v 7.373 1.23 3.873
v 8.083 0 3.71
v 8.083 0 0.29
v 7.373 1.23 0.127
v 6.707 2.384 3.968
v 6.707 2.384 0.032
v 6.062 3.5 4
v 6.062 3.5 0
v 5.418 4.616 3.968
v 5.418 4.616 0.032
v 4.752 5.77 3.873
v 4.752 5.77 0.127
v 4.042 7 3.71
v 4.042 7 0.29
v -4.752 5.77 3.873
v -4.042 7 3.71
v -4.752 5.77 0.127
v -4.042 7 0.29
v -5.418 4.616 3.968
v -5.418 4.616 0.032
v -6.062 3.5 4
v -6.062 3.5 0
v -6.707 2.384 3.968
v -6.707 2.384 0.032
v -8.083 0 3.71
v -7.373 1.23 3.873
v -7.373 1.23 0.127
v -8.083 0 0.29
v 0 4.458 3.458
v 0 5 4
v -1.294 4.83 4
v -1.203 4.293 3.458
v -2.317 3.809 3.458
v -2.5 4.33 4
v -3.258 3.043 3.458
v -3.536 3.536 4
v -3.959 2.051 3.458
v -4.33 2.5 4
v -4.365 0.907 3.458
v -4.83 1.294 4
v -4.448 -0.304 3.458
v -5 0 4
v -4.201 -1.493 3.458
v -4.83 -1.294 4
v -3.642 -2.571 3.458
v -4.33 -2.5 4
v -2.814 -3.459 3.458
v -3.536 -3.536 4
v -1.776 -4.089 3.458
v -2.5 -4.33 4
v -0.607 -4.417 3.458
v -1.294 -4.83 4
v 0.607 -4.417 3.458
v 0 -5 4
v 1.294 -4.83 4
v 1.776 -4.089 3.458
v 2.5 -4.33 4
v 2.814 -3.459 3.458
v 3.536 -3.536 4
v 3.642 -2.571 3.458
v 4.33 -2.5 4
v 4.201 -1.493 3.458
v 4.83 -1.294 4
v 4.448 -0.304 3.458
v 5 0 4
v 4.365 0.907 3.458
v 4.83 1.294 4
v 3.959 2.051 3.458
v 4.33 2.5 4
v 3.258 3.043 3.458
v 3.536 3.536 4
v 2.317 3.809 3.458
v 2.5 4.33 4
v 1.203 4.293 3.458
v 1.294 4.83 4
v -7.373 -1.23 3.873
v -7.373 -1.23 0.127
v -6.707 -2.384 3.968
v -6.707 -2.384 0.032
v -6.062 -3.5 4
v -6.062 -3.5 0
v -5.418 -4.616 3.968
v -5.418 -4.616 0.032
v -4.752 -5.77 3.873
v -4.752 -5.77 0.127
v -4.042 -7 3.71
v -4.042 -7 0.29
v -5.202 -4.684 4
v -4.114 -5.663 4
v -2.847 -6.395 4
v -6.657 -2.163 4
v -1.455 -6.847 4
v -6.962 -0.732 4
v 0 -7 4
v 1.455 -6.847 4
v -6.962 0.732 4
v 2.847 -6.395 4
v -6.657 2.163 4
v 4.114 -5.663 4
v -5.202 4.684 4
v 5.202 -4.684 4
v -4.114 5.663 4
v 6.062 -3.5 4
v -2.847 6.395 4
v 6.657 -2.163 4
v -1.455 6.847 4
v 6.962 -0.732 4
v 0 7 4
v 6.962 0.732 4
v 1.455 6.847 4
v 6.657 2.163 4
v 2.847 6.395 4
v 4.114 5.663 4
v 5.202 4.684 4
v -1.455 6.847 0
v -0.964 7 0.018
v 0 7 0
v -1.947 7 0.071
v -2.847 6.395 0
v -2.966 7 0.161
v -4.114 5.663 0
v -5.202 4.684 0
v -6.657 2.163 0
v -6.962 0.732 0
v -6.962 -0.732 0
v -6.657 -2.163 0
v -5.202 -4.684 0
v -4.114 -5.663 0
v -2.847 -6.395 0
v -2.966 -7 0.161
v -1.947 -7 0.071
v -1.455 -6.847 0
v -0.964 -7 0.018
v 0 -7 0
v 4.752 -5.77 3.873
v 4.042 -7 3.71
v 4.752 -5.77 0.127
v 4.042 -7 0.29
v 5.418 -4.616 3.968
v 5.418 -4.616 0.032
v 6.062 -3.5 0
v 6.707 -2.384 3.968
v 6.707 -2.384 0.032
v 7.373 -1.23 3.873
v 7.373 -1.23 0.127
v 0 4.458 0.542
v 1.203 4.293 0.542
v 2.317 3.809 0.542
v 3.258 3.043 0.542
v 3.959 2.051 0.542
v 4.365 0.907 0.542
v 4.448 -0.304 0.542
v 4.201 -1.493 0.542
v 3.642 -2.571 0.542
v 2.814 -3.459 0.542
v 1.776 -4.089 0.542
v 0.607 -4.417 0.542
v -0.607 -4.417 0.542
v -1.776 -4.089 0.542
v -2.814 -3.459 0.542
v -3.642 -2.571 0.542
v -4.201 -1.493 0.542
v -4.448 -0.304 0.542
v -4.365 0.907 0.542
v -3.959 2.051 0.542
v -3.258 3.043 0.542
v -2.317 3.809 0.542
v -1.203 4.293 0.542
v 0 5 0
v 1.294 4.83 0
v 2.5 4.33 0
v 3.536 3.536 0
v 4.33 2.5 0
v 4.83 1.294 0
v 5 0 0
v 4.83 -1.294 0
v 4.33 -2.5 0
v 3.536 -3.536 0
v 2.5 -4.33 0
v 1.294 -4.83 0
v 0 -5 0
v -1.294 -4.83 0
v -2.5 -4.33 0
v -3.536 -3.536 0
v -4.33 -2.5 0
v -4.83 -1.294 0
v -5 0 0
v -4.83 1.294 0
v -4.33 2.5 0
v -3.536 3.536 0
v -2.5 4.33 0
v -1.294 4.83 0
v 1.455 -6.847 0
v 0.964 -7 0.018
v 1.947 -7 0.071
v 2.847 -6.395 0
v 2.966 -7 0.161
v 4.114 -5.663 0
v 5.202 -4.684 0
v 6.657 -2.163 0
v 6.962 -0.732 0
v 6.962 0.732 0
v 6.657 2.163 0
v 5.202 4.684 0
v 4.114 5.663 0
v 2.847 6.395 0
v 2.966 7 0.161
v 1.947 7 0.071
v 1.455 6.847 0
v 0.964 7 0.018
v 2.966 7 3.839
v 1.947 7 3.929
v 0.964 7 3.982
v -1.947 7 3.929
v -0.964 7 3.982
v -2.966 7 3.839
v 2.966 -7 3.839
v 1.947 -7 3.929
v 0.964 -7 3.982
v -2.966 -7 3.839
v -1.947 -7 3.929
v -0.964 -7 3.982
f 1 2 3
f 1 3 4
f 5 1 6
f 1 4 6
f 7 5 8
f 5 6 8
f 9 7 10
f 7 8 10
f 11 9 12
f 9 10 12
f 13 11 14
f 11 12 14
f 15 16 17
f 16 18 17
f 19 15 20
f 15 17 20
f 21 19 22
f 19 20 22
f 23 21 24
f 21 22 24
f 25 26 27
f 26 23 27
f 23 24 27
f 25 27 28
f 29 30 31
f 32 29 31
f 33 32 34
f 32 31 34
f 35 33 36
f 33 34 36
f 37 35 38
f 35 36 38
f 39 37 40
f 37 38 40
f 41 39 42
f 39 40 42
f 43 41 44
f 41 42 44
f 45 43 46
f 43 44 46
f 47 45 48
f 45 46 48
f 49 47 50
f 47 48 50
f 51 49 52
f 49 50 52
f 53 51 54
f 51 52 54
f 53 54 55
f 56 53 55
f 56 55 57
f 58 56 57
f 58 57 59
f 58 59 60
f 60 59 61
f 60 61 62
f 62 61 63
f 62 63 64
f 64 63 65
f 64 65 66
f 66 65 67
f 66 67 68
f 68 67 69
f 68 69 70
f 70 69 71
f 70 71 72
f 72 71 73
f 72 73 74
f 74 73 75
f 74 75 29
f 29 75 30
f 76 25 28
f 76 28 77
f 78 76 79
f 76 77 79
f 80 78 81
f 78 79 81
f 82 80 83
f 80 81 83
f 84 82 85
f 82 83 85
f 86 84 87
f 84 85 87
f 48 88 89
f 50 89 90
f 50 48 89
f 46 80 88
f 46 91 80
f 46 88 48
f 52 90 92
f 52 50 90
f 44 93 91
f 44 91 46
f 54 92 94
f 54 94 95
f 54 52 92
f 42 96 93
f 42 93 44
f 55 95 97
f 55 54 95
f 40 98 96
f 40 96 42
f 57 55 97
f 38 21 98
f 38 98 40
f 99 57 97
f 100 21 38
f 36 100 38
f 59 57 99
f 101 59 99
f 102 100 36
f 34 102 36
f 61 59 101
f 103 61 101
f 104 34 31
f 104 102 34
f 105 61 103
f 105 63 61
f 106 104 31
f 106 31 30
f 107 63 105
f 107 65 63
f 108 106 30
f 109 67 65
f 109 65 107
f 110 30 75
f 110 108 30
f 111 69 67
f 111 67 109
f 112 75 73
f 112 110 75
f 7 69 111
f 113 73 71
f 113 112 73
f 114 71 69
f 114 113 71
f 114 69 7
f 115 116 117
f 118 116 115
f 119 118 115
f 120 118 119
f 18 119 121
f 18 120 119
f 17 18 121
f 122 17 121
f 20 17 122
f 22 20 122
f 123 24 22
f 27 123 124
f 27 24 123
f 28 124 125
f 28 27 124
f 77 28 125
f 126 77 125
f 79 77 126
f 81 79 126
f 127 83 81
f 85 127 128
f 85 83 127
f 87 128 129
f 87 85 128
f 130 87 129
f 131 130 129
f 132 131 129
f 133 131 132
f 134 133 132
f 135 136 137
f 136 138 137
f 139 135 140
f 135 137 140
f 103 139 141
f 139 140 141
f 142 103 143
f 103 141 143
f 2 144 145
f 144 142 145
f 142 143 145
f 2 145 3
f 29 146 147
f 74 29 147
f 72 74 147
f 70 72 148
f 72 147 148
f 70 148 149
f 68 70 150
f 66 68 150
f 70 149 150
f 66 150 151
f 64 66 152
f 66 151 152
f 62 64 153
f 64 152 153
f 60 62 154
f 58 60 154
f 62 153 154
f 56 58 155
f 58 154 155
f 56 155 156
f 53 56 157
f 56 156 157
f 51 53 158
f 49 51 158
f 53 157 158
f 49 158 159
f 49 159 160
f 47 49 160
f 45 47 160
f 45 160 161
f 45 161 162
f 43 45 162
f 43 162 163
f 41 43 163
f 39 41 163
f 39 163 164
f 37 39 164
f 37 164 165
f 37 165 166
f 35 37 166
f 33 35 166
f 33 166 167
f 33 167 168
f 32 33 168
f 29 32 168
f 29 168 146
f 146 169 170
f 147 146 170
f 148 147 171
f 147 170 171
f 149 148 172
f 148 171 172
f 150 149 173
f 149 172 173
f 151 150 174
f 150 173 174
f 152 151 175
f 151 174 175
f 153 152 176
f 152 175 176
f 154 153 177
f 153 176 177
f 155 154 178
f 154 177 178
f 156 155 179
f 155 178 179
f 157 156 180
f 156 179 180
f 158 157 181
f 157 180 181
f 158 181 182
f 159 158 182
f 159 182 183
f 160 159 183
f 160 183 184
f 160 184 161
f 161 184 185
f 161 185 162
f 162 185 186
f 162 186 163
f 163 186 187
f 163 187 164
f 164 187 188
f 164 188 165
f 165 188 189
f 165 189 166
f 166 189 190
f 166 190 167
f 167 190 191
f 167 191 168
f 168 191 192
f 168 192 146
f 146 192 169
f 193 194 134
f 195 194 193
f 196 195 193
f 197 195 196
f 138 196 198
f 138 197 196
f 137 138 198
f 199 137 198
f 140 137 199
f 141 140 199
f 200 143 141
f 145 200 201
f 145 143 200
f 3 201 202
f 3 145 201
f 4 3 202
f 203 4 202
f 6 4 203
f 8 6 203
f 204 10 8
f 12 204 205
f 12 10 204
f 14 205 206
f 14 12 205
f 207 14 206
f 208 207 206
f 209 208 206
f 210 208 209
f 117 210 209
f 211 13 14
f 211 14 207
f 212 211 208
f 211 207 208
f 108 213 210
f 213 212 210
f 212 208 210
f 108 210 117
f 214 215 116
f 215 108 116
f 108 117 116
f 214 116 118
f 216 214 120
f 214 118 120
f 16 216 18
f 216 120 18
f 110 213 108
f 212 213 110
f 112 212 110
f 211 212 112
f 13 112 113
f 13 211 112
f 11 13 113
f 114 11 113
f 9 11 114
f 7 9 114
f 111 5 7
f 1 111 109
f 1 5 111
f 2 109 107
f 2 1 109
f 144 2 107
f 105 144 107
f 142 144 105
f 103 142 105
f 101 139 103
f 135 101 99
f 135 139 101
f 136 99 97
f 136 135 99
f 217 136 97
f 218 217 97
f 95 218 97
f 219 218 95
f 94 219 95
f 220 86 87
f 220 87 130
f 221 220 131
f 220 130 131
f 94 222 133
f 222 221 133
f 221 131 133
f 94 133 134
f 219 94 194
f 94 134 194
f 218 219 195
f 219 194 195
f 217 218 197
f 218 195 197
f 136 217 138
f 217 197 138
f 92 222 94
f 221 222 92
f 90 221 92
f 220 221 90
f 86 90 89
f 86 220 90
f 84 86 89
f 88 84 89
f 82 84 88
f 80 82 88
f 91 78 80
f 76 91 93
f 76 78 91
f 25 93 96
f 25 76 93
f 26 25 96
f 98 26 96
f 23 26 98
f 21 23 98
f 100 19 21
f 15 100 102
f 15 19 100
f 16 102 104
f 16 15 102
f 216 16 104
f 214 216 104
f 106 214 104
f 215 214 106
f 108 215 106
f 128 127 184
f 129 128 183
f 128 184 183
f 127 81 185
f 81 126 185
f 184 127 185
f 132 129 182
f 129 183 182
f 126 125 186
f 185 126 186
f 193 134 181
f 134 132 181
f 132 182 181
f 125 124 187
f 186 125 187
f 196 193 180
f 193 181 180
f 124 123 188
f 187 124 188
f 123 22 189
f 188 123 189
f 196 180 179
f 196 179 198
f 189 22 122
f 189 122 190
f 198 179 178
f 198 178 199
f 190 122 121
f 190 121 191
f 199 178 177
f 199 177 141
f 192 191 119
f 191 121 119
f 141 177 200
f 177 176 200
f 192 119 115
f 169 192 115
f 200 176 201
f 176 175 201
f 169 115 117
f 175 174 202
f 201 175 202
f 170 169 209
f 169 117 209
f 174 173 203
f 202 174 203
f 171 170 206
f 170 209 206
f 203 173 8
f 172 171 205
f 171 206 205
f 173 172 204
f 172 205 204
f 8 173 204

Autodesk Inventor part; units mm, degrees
sketch "Sketch_1" plane through (0, 0, 0) normal (0, 0, 1) x (1, 0, 0)
  line L0 (-8.0829, 0) -> (-4.0415, -7)
  line L1 (-4.0415, -7) -> (4.0415, -7)
  line L2 (4.0415, -7) -> (8.0829, 0)
  line L3 (8.0829, 0) -> (4.0415, 7)
  line L4 (4.0415, 7) -> (-4.0415, 7)
  line L5 (-4.0415, 7) -> (-8.0829, 0)
extrude "Extrusion1" add sketch "Sketch_1" along normal blind 4
sketch "Sketch_2" plane through (0, 0, 0) normal (1, 0, 0) x (0, 1, 0)
  line L0 (0, 0) -> (0, 4)
  line L1 (0, 4) -> (5, 4)
  line L2 (5, 4) -> (4.4585, 3.4585)
  line L3 (4.4585, 3.4585) -> (4.4585, 0.5415)
  line L4 (4.4585, 0.5415) -> (5, 0)
  line L5 (5, 0) -> (0, 0)
  line L6 (0, 0) -> (0, 4)
revolve "Revolution1" cut sketch "Sketch_2" angle 360 about axis through (0, 0, 0) along (0, 0, -1)
thread "Thread1" size "M10x1" class "6H" standard "ISO Metric profile" full length
sketch "Sketch_3" plane through (0, 0, 0) normal (1, 0, 0) x (0, 1, 0)
  line L0 (0, -50) -> (0, 50)
  line L1 (17, 4) -> (7, 4)
  line L2 (7, 4) -> (13, 2.3923)
  line L3 (13, 2.3923) -> (13, 1.6077)
  line L4 (13, 1.6077) -> (7, 0)
  line L5 (7, 0) -> (17, 0)
  line L6 (17, 0) -> (17, 4)
revolve "Revolution2" cut sketch "Sketch_3" angle 360 about axis through (0, 0, -50) along (0, 0, -1)
ref_plane "ANBAU_XY" through (0, 0, 0) normal (0, 0, -1) x (1, 0, 0)
ref_plane "ANBAU_YZ" through (0, 0, 0) normal (1, 0, 0) x (0, -1, 0)
ref_plane "ANBAU_ZX" through (0, 0, 0) normal (0, -1, 0) x (0, 0, -1)
properties part number "5362901 M10x1"
